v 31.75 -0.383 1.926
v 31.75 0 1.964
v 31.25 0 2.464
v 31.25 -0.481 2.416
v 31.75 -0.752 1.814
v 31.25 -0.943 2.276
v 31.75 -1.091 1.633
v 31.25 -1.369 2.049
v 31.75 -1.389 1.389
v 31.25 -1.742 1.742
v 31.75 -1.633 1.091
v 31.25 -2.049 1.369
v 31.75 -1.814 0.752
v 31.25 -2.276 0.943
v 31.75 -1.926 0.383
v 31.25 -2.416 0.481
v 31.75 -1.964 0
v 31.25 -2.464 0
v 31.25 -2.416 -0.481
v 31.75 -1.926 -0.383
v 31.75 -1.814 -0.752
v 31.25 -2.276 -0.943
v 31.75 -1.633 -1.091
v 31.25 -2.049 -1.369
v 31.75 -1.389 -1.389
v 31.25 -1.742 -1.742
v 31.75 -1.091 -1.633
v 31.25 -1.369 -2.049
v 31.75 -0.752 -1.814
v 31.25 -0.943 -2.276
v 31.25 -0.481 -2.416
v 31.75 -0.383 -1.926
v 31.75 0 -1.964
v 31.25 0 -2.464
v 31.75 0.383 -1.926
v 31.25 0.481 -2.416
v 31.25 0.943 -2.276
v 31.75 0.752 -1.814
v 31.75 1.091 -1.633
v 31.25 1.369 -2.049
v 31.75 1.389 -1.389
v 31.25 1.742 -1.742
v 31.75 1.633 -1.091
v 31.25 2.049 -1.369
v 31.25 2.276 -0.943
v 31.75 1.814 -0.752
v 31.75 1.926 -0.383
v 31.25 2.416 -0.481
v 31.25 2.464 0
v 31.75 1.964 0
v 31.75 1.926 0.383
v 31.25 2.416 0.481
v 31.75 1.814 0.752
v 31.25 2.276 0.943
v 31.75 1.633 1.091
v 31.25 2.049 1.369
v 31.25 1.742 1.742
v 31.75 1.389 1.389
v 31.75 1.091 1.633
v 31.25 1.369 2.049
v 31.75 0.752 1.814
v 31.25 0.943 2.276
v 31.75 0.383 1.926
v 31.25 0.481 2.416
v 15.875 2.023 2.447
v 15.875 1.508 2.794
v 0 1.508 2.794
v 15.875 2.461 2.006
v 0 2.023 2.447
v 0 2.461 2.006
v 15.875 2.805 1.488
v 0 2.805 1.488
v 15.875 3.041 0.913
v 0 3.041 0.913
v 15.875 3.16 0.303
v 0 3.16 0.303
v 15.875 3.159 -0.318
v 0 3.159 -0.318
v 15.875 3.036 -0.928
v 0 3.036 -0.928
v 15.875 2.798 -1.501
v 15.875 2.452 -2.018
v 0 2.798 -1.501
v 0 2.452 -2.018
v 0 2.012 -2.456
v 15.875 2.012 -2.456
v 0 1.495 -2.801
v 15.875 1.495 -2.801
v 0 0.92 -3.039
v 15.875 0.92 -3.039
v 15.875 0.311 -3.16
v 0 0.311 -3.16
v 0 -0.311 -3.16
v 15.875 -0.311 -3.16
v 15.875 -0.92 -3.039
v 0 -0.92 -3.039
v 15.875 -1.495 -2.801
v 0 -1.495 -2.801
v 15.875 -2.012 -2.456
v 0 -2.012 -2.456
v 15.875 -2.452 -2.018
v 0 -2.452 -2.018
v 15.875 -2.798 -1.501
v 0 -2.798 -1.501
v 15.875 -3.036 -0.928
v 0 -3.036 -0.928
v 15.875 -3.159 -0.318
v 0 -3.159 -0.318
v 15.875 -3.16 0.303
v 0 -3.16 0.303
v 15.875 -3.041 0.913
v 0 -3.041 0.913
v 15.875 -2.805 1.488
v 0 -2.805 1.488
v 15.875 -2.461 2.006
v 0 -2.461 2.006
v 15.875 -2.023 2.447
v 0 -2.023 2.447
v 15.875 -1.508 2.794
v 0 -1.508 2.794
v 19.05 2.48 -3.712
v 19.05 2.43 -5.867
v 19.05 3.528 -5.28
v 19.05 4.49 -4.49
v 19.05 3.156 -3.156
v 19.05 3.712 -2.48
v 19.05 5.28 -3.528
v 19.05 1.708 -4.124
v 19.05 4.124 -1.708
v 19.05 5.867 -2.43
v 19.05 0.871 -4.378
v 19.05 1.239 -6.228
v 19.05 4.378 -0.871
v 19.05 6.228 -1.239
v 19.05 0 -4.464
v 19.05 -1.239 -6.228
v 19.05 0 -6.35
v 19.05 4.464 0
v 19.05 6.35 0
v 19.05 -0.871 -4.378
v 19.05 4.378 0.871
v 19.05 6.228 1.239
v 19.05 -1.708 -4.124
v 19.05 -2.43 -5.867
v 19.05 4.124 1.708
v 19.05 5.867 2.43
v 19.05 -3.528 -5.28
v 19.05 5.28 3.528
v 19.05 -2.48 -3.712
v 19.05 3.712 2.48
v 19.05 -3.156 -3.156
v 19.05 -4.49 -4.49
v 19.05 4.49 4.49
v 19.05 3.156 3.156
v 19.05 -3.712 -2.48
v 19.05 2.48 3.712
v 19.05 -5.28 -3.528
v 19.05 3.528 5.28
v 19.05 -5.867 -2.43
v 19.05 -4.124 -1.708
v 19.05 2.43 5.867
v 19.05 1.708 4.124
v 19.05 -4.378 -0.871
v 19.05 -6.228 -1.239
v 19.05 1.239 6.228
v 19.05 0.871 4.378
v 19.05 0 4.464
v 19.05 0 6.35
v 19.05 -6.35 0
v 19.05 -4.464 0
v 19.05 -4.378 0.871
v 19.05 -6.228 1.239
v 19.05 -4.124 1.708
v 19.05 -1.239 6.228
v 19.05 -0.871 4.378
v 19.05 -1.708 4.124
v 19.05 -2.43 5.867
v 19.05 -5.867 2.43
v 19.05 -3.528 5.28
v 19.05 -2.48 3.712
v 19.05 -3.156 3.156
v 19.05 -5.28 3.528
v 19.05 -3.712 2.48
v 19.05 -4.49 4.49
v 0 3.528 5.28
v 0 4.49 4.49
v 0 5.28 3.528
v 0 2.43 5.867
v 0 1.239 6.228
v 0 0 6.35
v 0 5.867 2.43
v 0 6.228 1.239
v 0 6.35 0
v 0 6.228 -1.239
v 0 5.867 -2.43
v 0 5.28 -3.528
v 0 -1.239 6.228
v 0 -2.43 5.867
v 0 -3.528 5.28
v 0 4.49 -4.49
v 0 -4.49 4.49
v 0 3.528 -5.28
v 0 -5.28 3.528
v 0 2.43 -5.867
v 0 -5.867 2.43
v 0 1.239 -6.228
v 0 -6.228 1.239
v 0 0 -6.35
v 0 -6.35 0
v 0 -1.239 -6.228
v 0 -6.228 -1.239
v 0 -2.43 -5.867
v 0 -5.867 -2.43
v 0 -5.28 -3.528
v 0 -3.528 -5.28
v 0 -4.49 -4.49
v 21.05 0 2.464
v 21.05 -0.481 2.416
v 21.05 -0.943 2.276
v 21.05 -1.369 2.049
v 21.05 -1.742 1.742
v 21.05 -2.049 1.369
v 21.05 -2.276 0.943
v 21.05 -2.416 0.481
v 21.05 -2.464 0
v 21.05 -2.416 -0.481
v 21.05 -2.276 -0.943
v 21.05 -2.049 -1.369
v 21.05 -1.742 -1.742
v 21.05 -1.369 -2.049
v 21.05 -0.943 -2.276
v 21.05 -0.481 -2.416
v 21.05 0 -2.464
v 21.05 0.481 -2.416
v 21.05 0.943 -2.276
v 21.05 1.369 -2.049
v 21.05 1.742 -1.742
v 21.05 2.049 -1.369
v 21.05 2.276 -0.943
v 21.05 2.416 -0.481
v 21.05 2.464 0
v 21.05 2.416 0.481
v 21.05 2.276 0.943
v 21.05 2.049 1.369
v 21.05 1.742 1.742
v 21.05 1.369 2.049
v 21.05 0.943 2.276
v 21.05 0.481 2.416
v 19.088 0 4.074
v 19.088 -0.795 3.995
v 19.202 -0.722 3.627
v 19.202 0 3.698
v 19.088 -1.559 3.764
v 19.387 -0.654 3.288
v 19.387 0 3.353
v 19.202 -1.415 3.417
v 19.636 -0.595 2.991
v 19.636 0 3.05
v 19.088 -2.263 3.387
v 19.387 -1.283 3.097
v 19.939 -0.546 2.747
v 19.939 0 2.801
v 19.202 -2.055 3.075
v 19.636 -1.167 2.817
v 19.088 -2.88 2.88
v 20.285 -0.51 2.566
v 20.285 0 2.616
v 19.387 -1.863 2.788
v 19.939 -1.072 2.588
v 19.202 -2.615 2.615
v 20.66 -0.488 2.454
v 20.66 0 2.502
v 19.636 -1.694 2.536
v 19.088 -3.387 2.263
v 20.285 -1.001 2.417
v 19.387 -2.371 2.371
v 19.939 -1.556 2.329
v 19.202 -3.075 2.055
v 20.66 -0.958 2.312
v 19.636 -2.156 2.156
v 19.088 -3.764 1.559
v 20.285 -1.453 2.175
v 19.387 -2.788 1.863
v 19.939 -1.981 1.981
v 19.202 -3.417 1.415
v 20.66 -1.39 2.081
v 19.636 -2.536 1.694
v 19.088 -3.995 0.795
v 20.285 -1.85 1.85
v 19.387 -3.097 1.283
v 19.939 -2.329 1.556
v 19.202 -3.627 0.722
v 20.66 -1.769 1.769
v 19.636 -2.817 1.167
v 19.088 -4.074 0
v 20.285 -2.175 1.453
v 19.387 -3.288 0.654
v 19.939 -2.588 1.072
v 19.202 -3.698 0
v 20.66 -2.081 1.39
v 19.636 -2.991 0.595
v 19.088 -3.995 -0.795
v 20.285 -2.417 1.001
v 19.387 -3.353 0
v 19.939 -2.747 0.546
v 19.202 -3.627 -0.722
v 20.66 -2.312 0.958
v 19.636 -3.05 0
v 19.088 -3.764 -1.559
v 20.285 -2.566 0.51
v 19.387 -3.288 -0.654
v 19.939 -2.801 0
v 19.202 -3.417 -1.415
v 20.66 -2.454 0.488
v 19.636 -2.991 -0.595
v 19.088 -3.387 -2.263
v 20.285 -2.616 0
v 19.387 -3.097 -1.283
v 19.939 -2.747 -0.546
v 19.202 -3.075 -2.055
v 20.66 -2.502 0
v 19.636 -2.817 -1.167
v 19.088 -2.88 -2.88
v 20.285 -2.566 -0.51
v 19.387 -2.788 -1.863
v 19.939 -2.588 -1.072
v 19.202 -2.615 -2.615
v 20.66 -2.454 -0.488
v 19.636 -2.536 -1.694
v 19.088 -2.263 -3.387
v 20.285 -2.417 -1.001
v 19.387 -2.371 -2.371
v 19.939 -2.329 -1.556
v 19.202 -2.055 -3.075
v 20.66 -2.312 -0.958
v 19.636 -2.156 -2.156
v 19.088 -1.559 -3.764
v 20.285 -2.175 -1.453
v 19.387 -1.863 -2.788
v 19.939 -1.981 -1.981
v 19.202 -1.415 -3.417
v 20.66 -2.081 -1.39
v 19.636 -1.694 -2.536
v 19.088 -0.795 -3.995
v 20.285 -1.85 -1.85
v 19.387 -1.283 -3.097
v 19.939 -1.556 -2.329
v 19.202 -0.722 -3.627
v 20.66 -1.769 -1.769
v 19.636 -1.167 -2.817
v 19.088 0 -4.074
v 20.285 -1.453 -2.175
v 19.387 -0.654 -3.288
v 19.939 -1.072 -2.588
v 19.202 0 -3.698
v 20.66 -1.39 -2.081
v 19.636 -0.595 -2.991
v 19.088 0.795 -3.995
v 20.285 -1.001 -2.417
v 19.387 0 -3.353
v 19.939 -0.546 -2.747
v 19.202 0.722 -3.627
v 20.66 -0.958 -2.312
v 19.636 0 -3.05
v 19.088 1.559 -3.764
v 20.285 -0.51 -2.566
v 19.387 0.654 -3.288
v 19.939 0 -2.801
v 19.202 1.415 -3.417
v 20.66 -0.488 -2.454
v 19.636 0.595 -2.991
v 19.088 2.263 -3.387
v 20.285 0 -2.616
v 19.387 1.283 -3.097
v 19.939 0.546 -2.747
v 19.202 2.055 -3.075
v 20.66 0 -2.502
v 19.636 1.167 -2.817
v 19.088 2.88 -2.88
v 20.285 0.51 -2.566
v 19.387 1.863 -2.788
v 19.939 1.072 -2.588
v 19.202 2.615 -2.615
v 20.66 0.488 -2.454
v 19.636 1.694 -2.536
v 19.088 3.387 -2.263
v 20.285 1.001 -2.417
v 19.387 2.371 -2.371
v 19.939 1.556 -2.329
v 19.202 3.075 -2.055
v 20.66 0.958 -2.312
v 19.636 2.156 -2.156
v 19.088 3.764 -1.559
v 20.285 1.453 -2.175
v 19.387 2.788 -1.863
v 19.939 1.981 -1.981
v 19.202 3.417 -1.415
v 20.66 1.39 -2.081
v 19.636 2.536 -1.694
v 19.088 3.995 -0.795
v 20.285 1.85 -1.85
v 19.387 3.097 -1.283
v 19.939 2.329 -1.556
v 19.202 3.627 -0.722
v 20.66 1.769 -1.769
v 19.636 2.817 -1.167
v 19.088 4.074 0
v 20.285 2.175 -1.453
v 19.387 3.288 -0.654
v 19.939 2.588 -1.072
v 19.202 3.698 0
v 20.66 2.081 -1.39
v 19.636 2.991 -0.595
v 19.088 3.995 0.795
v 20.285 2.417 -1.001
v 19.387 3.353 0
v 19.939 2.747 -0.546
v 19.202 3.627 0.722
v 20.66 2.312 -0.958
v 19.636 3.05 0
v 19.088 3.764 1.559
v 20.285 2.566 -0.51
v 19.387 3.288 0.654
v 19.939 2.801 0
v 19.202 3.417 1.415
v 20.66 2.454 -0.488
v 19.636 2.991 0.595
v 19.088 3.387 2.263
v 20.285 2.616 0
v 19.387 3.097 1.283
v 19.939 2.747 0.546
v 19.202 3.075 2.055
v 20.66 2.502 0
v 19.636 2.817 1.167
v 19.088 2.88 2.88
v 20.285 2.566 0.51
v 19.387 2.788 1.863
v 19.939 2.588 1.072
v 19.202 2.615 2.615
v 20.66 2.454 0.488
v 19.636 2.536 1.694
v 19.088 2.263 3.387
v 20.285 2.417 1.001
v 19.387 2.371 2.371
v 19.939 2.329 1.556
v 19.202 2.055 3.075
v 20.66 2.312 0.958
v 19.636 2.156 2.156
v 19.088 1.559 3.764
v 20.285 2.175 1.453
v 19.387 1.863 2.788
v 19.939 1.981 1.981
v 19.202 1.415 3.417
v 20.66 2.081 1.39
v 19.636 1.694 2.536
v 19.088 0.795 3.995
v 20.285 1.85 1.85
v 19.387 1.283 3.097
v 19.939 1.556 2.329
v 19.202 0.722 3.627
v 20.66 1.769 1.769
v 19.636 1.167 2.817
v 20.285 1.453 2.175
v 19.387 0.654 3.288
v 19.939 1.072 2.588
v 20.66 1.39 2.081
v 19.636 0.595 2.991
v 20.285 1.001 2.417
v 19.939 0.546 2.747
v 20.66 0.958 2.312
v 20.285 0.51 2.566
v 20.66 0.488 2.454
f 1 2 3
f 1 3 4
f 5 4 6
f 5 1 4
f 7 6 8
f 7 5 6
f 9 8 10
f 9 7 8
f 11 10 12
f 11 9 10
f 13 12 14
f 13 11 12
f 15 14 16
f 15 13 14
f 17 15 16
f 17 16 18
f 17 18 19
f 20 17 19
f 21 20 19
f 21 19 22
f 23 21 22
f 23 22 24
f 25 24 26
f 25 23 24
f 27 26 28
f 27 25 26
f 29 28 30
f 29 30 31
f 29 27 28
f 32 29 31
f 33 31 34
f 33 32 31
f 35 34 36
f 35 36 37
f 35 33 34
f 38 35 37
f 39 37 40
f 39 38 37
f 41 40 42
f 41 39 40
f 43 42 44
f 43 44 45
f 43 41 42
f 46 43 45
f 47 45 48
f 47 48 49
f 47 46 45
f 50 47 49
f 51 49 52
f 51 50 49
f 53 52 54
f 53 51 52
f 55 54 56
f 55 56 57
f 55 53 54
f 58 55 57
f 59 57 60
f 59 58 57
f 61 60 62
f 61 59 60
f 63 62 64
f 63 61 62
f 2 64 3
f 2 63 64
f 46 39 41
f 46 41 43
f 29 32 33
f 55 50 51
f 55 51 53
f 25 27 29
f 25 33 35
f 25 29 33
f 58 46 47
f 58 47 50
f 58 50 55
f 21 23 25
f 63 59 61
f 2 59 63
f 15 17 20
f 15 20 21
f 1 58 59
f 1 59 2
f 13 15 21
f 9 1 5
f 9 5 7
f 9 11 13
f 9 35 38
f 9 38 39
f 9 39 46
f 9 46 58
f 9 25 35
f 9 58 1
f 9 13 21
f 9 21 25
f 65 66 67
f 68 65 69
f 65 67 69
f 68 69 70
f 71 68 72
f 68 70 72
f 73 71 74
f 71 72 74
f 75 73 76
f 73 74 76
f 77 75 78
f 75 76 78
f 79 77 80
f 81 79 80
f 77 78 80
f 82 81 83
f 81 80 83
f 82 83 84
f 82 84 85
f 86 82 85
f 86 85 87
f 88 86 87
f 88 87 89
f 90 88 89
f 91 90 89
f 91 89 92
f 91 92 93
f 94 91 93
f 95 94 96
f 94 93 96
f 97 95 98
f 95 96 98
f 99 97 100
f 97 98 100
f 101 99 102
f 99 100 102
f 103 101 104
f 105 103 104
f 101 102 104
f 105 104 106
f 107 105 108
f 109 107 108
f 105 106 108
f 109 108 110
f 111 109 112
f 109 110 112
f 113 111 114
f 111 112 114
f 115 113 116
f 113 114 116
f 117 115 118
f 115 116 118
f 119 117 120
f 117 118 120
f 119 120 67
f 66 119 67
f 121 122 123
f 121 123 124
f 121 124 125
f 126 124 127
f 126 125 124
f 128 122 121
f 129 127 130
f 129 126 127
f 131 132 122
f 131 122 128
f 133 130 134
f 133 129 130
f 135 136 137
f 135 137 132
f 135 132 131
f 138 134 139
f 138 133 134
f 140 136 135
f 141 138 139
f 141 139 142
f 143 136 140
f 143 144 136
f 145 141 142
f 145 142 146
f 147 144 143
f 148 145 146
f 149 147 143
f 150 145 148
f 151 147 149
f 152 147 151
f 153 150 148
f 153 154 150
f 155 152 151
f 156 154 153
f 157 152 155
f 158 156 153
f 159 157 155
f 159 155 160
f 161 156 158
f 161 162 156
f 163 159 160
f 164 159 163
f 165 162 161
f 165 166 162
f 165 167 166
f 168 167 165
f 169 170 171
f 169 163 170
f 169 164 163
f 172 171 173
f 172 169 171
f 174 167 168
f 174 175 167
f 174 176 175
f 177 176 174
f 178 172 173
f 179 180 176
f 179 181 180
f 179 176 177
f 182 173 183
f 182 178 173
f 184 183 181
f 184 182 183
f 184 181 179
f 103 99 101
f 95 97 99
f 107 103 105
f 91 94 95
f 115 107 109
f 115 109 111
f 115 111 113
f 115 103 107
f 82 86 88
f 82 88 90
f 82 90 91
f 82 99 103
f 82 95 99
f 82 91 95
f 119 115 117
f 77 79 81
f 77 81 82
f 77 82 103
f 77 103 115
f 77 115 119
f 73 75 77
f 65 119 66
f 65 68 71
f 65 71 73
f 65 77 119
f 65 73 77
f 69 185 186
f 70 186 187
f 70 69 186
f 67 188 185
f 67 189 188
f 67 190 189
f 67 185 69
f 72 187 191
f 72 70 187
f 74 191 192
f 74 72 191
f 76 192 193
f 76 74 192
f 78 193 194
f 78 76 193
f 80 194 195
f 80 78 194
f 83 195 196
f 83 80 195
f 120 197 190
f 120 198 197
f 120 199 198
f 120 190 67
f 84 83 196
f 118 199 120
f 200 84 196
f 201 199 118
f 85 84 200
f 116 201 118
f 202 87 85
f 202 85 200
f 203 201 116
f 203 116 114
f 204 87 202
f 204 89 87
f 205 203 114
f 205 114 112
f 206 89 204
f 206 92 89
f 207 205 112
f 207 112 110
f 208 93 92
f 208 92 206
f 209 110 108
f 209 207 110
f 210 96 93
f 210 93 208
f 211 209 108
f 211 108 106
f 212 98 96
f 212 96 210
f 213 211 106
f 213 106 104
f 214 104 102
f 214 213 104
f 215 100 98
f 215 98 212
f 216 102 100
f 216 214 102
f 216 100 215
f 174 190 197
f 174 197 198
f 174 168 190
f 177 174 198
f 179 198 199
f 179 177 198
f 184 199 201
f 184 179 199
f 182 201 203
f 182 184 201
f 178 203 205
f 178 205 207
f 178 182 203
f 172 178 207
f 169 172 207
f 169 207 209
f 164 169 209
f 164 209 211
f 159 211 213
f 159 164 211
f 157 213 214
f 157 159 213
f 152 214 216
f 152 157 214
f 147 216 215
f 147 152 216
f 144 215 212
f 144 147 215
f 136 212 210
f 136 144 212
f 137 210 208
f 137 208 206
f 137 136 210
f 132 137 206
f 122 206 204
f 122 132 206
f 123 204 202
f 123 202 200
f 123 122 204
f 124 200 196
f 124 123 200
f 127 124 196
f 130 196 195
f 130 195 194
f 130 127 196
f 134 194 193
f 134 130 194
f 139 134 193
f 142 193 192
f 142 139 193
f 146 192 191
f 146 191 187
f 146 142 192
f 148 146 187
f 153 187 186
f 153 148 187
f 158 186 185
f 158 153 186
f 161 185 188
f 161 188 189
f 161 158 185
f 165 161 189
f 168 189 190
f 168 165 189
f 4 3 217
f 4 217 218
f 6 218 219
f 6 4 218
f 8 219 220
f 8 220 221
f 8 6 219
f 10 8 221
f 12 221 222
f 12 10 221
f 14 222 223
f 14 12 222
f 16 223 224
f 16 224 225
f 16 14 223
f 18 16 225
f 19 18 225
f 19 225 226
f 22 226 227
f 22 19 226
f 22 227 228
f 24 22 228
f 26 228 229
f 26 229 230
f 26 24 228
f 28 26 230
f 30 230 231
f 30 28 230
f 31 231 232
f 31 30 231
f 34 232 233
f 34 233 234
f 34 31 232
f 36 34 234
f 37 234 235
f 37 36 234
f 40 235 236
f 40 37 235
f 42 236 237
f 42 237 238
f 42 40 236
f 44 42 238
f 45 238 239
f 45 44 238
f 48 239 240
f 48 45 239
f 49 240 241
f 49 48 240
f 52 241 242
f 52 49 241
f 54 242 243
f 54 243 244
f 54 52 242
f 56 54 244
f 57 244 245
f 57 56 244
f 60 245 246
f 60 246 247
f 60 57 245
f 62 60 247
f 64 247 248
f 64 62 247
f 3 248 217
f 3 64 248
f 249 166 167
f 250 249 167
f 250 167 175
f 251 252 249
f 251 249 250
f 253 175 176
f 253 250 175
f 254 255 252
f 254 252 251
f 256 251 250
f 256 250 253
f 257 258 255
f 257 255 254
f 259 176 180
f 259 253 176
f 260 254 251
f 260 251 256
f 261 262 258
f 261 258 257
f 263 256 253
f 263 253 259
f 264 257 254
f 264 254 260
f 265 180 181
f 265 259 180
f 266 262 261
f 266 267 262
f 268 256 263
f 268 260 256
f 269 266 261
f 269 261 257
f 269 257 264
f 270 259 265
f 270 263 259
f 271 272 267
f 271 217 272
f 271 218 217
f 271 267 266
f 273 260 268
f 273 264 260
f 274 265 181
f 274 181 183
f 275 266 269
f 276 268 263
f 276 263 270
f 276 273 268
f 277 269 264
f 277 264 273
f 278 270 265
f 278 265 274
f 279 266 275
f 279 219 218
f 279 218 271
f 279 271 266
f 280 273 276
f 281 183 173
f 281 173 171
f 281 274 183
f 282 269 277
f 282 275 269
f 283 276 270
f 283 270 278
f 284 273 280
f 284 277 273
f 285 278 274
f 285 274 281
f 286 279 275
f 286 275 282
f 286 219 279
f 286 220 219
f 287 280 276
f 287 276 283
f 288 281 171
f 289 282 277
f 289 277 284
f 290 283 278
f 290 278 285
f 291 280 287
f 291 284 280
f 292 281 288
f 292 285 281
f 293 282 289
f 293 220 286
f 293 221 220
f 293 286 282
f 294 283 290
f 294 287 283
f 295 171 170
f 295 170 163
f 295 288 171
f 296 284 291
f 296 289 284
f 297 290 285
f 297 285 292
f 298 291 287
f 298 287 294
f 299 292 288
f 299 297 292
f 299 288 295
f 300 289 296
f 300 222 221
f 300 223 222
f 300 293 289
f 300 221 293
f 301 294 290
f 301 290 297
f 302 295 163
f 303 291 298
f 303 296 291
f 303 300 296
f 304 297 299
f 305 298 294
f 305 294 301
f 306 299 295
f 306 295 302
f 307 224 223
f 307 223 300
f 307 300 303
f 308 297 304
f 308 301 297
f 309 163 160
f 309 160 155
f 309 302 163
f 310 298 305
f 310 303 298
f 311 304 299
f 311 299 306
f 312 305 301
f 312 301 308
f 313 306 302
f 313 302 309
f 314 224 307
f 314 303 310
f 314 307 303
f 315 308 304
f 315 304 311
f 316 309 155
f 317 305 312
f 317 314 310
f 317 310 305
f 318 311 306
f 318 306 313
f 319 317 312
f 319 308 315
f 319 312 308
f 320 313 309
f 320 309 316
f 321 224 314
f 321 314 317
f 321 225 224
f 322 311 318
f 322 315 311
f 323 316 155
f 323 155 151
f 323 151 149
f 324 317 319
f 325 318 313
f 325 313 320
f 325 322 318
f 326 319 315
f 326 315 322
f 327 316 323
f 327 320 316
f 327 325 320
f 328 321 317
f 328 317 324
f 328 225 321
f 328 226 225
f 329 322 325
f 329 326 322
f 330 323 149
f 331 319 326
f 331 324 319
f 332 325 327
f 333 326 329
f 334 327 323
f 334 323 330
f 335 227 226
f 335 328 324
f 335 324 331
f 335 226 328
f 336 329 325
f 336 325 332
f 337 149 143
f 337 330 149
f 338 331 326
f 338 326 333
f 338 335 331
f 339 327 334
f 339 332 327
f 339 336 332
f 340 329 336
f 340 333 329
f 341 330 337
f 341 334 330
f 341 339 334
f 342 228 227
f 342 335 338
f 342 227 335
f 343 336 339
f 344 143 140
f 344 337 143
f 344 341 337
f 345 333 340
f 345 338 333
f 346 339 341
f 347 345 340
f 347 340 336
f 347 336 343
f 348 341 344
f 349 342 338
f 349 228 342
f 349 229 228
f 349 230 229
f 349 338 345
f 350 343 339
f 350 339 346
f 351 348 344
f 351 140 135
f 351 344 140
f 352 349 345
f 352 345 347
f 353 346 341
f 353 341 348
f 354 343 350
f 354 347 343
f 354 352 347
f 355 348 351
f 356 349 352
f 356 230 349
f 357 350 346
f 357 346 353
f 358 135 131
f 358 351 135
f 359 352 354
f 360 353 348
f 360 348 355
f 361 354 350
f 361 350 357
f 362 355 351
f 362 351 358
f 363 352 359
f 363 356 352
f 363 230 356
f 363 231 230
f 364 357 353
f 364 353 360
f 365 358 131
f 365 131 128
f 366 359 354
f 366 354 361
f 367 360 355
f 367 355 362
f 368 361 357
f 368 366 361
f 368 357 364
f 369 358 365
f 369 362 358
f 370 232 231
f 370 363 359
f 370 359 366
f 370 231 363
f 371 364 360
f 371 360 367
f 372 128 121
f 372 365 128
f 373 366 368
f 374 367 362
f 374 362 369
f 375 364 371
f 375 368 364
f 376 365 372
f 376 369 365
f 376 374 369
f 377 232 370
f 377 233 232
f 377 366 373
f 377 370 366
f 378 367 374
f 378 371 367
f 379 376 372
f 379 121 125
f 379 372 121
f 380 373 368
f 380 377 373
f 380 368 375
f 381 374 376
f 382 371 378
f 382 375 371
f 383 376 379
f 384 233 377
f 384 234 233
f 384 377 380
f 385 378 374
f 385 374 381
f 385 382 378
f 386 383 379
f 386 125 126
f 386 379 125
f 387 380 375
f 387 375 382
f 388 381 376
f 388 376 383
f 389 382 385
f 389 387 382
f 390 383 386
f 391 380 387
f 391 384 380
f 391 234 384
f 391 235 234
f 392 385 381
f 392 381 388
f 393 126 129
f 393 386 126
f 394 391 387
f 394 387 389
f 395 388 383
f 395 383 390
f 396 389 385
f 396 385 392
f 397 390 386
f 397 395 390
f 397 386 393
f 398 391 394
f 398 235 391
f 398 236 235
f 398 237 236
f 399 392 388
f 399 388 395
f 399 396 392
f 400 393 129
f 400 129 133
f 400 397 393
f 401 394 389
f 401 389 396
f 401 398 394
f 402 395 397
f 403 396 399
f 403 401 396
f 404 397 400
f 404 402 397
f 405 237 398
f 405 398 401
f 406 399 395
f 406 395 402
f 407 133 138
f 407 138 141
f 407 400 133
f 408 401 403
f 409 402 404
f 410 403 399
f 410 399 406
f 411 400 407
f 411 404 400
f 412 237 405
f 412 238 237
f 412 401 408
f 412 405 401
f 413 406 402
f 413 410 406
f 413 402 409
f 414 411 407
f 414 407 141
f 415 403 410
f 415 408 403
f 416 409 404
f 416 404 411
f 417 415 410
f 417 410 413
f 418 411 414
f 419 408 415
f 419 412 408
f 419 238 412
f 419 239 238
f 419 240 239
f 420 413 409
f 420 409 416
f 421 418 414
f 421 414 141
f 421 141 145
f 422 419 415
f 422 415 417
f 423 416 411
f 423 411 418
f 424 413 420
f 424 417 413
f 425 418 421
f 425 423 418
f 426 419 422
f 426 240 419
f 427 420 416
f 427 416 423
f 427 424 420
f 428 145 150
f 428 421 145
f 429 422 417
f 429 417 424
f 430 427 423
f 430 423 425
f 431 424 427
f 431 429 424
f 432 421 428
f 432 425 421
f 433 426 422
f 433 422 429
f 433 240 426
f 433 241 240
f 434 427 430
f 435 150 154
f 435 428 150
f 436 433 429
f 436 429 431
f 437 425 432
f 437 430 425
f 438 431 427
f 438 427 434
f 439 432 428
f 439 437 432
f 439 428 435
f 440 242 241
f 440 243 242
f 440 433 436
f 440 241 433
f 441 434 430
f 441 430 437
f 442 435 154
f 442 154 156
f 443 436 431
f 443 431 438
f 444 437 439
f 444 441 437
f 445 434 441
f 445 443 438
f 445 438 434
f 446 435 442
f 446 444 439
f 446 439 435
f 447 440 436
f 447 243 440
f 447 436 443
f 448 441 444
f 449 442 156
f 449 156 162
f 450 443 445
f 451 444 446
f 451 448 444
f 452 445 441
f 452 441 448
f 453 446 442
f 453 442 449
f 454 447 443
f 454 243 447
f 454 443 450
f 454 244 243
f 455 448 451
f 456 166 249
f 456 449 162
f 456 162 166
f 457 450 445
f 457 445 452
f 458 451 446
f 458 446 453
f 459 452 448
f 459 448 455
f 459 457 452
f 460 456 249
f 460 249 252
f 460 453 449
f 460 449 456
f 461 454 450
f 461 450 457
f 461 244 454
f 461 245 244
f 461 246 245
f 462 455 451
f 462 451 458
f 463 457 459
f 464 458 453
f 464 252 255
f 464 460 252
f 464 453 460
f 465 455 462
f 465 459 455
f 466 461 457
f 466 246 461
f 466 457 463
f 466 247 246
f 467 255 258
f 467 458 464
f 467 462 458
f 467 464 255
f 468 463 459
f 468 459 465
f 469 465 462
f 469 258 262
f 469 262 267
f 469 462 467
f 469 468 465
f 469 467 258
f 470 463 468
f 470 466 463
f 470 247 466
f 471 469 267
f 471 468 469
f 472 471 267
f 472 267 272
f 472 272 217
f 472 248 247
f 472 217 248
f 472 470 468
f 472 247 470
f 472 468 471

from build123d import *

# Parameters (mm, degrees)
CONG_1_R                = 2
ENL_V_MAT_EXTRU_1_DEPTH = 15.875
CHANFREIN1_SIZE         = 0.5


with BuildPart() as part:
    # Esquisse3 → Révolution1 (revolve)
    with BuildSketch(Plane(origin=(0, 0, 0), x_dir=(1, 0, 0), z_dir=(0, 1, 0)), mode=Mode.PRIVATE) as r_volution1_sk:
        Polygon((0, 6.35), (19.05, 6.35), (19.05, 2.4638), (31.75, 2.4638), (31.75, 0), (0, 0), align=None)
    revolve(r_volution1_sk.sketch.rotate(Axis((0, 0, 0), (1, 0, 0)), 180), axis=Axis((0, 0, 0), (1, 0, 0)))

    # Congé1
    cong_1_edges = [part.edges().sort_by_distance(p)[0] for p in [
        (19.05, 0, -2.4638),
    ]]
    fillet(cong_1_edges, radius=CONG_1_R)

    # Esquisse4 → Enlèv. mat.-Extru.1 (cut)
    with BuildSketch(Plane.ZY):
        with BuildLine():
            Line((2.794, -1.508041445), (2.794, 1.508041445))
            ThreePointArc((2.794, 1.508041445), (-3.175, 0), (2.794, -1.508041445))
        make_face()
    extrude(amount=-ENL_V_MAT_EXTRU_1_DEPTH, mode=Mode.SUBTRACT)

    # Chanfrein1
    chanfrein1_edges = [part.edges().sort_by_distance(p)[0] for p in [
        (31.75, 0, -2.4638),
    ]]
    chamfer(chanfrein1_edges, length=CHANFREIN1_SIZE)


solid = part.part
